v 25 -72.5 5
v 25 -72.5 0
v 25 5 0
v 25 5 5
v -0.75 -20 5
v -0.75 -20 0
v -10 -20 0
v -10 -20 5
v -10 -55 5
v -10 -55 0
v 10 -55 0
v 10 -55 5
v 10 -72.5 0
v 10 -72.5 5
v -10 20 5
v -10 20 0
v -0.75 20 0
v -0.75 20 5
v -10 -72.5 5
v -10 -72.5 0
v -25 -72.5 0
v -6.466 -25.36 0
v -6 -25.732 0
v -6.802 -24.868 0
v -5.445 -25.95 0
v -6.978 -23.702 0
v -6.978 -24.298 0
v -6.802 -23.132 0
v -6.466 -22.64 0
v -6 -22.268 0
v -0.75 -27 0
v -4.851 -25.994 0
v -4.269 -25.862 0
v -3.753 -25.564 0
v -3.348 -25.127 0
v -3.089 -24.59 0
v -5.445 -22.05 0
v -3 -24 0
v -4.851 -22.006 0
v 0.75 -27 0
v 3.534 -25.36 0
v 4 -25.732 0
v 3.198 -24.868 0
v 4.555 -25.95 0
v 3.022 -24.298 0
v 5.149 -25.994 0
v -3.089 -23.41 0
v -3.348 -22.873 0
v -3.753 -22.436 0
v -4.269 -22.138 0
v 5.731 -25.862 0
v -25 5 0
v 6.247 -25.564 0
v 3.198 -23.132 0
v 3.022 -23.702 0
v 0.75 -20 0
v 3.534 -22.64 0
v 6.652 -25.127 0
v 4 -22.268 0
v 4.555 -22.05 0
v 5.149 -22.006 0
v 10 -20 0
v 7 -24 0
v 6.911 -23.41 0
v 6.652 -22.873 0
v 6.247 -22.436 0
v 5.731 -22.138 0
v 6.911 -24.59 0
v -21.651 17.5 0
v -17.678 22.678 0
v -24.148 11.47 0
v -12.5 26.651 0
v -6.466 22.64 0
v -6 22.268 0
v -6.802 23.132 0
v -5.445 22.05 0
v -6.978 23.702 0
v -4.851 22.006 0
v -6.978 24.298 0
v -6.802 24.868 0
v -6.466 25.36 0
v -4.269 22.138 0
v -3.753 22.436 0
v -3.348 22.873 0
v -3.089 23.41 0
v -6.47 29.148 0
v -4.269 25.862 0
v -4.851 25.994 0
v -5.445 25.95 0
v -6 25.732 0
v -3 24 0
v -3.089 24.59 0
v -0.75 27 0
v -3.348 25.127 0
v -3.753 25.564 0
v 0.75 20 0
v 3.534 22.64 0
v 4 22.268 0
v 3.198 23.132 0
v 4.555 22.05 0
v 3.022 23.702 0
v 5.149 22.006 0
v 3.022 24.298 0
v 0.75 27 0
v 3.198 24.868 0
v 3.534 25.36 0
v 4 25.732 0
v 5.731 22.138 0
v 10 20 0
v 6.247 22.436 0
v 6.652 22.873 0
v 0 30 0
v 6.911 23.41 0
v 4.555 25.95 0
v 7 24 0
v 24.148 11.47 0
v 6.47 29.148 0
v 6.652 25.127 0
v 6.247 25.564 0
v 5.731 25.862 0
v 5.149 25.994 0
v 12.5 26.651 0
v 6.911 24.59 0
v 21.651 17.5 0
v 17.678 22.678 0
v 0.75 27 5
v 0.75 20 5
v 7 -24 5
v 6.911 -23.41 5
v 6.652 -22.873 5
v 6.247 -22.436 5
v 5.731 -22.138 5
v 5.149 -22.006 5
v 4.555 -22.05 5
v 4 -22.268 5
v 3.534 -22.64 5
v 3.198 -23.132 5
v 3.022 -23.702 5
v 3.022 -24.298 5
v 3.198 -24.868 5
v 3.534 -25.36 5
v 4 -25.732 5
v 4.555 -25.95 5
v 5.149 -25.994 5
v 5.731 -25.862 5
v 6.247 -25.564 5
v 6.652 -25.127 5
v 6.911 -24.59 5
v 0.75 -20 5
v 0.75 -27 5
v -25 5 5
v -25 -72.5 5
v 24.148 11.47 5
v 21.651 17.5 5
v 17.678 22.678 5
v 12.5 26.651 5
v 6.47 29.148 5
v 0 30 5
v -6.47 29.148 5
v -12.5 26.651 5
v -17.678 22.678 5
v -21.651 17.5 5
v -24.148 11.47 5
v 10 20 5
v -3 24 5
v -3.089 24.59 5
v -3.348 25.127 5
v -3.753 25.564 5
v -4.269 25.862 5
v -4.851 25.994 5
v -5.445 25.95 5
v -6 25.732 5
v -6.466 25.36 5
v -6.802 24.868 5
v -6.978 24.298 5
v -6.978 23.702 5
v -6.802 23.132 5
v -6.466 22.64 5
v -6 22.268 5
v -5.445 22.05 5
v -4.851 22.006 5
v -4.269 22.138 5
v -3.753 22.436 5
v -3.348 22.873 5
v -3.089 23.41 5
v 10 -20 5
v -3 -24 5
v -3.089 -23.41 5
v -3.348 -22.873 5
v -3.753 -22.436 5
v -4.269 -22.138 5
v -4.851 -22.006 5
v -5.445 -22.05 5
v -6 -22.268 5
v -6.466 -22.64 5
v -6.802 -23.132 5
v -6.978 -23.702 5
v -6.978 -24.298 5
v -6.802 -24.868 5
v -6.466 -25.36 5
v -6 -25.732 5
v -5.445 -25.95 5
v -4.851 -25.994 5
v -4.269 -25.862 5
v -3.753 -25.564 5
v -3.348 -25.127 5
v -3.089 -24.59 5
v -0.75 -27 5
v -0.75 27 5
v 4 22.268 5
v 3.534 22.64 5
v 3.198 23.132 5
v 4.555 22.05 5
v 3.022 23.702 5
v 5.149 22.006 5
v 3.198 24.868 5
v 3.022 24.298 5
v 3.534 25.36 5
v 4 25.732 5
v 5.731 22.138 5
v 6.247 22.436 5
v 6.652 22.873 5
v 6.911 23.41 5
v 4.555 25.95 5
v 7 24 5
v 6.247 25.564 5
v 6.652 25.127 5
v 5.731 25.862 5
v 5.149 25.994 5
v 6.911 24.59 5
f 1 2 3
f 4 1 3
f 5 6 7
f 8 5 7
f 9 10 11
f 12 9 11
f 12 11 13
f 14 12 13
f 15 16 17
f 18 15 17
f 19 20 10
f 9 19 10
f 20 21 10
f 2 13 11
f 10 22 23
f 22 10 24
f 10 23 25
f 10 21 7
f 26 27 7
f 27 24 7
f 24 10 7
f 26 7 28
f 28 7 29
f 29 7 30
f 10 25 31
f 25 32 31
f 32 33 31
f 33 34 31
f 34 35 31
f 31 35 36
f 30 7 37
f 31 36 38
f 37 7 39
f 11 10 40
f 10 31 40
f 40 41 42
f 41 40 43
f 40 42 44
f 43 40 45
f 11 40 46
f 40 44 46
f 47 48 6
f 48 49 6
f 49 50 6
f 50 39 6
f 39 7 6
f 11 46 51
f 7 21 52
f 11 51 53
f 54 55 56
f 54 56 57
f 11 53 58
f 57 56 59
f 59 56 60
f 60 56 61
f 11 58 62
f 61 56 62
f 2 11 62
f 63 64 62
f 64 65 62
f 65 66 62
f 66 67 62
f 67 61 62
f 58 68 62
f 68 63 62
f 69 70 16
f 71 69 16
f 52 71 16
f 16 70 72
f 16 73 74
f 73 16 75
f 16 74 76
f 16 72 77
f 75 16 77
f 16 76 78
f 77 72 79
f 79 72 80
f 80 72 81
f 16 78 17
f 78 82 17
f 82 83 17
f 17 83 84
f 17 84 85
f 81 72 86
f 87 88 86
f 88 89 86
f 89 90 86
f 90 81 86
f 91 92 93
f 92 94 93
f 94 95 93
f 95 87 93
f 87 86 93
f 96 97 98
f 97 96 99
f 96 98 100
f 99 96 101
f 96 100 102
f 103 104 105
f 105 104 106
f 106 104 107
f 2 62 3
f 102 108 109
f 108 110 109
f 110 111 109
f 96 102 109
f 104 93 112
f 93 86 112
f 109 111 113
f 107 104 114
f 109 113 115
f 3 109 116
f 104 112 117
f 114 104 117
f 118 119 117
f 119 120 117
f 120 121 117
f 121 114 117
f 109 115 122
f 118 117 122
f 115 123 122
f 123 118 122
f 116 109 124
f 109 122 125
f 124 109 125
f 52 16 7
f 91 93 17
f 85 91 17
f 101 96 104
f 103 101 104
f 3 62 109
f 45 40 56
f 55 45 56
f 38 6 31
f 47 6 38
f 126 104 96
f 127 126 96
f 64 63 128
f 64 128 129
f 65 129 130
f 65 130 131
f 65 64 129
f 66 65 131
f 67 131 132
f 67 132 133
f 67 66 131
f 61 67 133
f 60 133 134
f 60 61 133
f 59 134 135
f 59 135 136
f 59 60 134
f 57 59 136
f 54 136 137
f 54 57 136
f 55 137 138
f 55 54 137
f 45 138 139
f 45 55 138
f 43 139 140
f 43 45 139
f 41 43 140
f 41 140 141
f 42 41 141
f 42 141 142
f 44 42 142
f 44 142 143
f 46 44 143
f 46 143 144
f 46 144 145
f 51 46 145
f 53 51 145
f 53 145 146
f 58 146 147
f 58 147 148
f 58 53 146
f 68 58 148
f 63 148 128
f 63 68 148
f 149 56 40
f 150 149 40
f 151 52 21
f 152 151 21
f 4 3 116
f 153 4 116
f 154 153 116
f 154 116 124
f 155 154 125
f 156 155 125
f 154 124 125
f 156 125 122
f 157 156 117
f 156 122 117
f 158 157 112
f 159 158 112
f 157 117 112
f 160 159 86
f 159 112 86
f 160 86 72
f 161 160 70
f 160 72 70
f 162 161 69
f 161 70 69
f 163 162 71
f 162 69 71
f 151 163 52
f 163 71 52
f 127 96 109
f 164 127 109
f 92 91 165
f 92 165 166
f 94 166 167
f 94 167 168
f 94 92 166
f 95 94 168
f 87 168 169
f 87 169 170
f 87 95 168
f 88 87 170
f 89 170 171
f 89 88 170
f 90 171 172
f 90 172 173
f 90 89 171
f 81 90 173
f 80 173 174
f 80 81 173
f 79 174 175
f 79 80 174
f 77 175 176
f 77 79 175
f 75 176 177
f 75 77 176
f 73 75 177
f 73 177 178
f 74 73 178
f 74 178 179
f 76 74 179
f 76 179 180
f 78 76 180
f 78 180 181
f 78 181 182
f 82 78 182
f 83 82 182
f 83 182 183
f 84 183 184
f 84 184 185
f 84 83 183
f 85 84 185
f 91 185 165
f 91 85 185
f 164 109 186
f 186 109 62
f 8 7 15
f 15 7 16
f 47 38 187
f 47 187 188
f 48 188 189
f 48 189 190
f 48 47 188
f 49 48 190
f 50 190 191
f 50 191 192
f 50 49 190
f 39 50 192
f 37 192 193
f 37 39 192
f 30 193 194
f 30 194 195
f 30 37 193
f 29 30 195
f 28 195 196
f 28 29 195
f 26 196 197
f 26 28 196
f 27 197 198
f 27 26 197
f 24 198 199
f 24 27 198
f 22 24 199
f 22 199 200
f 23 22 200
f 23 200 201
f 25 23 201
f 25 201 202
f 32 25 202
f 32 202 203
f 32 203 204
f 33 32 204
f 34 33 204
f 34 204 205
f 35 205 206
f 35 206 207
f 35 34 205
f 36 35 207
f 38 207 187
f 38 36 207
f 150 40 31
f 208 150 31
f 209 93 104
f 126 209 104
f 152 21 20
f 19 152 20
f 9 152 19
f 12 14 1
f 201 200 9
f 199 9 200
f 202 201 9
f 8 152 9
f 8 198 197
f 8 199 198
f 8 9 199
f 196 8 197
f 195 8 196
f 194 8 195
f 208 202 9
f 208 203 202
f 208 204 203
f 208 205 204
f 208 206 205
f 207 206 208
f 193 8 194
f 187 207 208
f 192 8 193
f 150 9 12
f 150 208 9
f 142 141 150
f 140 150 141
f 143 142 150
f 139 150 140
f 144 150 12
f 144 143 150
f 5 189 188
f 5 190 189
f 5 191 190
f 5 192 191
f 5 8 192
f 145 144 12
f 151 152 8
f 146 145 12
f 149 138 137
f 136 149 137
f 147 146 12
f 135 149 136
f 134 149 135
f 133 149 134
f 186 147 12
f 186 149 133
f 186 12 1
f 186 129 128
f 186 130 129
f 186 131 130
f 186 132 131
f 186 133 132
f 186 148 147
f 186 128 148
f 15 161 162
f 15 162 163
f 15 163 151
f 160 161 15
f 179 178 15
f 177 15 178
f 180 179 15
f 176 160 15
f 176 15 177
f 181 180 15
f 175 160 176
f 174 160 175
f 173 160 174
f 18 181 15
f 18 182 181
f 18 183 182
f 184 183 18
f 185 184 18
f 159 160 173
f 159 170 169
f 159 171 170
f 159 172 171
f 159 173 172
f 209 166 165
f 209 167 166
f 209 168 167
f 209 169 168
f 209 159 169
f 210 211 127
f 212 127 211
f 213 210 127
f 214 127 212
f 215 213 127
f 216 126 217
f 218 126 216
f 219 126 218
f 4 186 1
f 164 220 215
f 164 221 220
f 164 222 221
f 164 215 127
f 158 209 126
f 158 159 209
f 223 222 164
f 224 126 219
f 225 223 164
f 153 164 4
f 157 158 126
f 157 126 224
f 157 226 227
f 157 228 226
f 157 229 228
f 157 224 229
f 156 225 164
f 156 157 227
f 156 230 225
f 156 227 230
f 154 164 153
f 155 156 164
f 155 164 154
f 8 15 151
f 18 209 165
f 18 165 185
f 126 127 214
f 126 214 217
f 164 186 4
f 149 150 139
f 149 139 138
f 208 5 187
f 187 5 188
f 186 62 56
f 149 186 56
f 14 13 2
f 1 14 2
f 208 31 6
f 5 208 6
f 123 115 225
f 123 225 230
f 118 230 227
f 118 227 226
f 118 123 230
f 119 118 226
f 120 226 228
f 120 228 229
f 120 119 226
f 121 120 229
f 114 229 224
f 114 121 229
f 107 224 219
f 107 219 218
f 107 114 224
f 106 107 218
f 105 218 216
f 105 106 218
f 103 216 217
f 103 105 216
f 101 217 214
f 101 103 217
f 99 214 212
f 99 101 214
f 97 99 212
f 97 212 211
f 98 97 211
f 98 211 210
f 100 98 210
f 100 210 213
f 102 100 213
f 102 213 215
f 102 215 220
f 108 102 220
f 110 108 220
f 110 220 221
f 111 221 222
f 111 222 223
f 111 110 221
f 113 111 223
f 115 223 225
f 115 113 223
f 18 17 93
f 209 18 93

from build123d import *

# Parameters (mm, degrees)
SKETCH1_R           = 2
BOSS_EXTRUDE1_DEPTH = 5


with BuildPart() as part:
    # Sketch1 → Boss-Extrude1 (new body)
    with BuildSketch(Plane.XY):
        with BuildLine():
            ThreePointArc((25, 5), (0, 30), (-25, 5))
            Line((-25, 5), (-25, -72.5))
            Line((-25, -72.5), (-10, -72.5))
            Line((-10, -72.5), (-10, -55))
            Line((-10, -55), (10, -55))
            Line((10, -55), (10, -72.5))
            Line((10, -72.5), (25, -72.5))
            Line((25, -72.5), (25, 5))
        make_face()
        Polygon((-10, 20), (-0.75, 20), (-0.75, 27), (0.75, 27), (0.75, 20), (10, 20), (10, -20), (0.75, -20), (0.75, -27), (-0.75, -27), (-0.75, -20), (-10, -20), align=None, mode=Mode.SUBTRACT)
        with Locations((-5, 24)):
            Circle(SKETCH1_R, mode=Mode.SUBTRACT)
        with Locations((5, 24)):
            Circle(SKETCH1_R, mode=Mode.SUBTRACT)
        with Locations((-5, -24)):
            Circle(SKETCH1_R, mode=Mode.SUBTRACT)
        with Locations((5, -24)):
            Circle(SKETCH1_R, mode=Mode.SUBTRACT)
    extrude(amount=BOSS_EXTRUDE1_DEPTH)


solid = part.part
